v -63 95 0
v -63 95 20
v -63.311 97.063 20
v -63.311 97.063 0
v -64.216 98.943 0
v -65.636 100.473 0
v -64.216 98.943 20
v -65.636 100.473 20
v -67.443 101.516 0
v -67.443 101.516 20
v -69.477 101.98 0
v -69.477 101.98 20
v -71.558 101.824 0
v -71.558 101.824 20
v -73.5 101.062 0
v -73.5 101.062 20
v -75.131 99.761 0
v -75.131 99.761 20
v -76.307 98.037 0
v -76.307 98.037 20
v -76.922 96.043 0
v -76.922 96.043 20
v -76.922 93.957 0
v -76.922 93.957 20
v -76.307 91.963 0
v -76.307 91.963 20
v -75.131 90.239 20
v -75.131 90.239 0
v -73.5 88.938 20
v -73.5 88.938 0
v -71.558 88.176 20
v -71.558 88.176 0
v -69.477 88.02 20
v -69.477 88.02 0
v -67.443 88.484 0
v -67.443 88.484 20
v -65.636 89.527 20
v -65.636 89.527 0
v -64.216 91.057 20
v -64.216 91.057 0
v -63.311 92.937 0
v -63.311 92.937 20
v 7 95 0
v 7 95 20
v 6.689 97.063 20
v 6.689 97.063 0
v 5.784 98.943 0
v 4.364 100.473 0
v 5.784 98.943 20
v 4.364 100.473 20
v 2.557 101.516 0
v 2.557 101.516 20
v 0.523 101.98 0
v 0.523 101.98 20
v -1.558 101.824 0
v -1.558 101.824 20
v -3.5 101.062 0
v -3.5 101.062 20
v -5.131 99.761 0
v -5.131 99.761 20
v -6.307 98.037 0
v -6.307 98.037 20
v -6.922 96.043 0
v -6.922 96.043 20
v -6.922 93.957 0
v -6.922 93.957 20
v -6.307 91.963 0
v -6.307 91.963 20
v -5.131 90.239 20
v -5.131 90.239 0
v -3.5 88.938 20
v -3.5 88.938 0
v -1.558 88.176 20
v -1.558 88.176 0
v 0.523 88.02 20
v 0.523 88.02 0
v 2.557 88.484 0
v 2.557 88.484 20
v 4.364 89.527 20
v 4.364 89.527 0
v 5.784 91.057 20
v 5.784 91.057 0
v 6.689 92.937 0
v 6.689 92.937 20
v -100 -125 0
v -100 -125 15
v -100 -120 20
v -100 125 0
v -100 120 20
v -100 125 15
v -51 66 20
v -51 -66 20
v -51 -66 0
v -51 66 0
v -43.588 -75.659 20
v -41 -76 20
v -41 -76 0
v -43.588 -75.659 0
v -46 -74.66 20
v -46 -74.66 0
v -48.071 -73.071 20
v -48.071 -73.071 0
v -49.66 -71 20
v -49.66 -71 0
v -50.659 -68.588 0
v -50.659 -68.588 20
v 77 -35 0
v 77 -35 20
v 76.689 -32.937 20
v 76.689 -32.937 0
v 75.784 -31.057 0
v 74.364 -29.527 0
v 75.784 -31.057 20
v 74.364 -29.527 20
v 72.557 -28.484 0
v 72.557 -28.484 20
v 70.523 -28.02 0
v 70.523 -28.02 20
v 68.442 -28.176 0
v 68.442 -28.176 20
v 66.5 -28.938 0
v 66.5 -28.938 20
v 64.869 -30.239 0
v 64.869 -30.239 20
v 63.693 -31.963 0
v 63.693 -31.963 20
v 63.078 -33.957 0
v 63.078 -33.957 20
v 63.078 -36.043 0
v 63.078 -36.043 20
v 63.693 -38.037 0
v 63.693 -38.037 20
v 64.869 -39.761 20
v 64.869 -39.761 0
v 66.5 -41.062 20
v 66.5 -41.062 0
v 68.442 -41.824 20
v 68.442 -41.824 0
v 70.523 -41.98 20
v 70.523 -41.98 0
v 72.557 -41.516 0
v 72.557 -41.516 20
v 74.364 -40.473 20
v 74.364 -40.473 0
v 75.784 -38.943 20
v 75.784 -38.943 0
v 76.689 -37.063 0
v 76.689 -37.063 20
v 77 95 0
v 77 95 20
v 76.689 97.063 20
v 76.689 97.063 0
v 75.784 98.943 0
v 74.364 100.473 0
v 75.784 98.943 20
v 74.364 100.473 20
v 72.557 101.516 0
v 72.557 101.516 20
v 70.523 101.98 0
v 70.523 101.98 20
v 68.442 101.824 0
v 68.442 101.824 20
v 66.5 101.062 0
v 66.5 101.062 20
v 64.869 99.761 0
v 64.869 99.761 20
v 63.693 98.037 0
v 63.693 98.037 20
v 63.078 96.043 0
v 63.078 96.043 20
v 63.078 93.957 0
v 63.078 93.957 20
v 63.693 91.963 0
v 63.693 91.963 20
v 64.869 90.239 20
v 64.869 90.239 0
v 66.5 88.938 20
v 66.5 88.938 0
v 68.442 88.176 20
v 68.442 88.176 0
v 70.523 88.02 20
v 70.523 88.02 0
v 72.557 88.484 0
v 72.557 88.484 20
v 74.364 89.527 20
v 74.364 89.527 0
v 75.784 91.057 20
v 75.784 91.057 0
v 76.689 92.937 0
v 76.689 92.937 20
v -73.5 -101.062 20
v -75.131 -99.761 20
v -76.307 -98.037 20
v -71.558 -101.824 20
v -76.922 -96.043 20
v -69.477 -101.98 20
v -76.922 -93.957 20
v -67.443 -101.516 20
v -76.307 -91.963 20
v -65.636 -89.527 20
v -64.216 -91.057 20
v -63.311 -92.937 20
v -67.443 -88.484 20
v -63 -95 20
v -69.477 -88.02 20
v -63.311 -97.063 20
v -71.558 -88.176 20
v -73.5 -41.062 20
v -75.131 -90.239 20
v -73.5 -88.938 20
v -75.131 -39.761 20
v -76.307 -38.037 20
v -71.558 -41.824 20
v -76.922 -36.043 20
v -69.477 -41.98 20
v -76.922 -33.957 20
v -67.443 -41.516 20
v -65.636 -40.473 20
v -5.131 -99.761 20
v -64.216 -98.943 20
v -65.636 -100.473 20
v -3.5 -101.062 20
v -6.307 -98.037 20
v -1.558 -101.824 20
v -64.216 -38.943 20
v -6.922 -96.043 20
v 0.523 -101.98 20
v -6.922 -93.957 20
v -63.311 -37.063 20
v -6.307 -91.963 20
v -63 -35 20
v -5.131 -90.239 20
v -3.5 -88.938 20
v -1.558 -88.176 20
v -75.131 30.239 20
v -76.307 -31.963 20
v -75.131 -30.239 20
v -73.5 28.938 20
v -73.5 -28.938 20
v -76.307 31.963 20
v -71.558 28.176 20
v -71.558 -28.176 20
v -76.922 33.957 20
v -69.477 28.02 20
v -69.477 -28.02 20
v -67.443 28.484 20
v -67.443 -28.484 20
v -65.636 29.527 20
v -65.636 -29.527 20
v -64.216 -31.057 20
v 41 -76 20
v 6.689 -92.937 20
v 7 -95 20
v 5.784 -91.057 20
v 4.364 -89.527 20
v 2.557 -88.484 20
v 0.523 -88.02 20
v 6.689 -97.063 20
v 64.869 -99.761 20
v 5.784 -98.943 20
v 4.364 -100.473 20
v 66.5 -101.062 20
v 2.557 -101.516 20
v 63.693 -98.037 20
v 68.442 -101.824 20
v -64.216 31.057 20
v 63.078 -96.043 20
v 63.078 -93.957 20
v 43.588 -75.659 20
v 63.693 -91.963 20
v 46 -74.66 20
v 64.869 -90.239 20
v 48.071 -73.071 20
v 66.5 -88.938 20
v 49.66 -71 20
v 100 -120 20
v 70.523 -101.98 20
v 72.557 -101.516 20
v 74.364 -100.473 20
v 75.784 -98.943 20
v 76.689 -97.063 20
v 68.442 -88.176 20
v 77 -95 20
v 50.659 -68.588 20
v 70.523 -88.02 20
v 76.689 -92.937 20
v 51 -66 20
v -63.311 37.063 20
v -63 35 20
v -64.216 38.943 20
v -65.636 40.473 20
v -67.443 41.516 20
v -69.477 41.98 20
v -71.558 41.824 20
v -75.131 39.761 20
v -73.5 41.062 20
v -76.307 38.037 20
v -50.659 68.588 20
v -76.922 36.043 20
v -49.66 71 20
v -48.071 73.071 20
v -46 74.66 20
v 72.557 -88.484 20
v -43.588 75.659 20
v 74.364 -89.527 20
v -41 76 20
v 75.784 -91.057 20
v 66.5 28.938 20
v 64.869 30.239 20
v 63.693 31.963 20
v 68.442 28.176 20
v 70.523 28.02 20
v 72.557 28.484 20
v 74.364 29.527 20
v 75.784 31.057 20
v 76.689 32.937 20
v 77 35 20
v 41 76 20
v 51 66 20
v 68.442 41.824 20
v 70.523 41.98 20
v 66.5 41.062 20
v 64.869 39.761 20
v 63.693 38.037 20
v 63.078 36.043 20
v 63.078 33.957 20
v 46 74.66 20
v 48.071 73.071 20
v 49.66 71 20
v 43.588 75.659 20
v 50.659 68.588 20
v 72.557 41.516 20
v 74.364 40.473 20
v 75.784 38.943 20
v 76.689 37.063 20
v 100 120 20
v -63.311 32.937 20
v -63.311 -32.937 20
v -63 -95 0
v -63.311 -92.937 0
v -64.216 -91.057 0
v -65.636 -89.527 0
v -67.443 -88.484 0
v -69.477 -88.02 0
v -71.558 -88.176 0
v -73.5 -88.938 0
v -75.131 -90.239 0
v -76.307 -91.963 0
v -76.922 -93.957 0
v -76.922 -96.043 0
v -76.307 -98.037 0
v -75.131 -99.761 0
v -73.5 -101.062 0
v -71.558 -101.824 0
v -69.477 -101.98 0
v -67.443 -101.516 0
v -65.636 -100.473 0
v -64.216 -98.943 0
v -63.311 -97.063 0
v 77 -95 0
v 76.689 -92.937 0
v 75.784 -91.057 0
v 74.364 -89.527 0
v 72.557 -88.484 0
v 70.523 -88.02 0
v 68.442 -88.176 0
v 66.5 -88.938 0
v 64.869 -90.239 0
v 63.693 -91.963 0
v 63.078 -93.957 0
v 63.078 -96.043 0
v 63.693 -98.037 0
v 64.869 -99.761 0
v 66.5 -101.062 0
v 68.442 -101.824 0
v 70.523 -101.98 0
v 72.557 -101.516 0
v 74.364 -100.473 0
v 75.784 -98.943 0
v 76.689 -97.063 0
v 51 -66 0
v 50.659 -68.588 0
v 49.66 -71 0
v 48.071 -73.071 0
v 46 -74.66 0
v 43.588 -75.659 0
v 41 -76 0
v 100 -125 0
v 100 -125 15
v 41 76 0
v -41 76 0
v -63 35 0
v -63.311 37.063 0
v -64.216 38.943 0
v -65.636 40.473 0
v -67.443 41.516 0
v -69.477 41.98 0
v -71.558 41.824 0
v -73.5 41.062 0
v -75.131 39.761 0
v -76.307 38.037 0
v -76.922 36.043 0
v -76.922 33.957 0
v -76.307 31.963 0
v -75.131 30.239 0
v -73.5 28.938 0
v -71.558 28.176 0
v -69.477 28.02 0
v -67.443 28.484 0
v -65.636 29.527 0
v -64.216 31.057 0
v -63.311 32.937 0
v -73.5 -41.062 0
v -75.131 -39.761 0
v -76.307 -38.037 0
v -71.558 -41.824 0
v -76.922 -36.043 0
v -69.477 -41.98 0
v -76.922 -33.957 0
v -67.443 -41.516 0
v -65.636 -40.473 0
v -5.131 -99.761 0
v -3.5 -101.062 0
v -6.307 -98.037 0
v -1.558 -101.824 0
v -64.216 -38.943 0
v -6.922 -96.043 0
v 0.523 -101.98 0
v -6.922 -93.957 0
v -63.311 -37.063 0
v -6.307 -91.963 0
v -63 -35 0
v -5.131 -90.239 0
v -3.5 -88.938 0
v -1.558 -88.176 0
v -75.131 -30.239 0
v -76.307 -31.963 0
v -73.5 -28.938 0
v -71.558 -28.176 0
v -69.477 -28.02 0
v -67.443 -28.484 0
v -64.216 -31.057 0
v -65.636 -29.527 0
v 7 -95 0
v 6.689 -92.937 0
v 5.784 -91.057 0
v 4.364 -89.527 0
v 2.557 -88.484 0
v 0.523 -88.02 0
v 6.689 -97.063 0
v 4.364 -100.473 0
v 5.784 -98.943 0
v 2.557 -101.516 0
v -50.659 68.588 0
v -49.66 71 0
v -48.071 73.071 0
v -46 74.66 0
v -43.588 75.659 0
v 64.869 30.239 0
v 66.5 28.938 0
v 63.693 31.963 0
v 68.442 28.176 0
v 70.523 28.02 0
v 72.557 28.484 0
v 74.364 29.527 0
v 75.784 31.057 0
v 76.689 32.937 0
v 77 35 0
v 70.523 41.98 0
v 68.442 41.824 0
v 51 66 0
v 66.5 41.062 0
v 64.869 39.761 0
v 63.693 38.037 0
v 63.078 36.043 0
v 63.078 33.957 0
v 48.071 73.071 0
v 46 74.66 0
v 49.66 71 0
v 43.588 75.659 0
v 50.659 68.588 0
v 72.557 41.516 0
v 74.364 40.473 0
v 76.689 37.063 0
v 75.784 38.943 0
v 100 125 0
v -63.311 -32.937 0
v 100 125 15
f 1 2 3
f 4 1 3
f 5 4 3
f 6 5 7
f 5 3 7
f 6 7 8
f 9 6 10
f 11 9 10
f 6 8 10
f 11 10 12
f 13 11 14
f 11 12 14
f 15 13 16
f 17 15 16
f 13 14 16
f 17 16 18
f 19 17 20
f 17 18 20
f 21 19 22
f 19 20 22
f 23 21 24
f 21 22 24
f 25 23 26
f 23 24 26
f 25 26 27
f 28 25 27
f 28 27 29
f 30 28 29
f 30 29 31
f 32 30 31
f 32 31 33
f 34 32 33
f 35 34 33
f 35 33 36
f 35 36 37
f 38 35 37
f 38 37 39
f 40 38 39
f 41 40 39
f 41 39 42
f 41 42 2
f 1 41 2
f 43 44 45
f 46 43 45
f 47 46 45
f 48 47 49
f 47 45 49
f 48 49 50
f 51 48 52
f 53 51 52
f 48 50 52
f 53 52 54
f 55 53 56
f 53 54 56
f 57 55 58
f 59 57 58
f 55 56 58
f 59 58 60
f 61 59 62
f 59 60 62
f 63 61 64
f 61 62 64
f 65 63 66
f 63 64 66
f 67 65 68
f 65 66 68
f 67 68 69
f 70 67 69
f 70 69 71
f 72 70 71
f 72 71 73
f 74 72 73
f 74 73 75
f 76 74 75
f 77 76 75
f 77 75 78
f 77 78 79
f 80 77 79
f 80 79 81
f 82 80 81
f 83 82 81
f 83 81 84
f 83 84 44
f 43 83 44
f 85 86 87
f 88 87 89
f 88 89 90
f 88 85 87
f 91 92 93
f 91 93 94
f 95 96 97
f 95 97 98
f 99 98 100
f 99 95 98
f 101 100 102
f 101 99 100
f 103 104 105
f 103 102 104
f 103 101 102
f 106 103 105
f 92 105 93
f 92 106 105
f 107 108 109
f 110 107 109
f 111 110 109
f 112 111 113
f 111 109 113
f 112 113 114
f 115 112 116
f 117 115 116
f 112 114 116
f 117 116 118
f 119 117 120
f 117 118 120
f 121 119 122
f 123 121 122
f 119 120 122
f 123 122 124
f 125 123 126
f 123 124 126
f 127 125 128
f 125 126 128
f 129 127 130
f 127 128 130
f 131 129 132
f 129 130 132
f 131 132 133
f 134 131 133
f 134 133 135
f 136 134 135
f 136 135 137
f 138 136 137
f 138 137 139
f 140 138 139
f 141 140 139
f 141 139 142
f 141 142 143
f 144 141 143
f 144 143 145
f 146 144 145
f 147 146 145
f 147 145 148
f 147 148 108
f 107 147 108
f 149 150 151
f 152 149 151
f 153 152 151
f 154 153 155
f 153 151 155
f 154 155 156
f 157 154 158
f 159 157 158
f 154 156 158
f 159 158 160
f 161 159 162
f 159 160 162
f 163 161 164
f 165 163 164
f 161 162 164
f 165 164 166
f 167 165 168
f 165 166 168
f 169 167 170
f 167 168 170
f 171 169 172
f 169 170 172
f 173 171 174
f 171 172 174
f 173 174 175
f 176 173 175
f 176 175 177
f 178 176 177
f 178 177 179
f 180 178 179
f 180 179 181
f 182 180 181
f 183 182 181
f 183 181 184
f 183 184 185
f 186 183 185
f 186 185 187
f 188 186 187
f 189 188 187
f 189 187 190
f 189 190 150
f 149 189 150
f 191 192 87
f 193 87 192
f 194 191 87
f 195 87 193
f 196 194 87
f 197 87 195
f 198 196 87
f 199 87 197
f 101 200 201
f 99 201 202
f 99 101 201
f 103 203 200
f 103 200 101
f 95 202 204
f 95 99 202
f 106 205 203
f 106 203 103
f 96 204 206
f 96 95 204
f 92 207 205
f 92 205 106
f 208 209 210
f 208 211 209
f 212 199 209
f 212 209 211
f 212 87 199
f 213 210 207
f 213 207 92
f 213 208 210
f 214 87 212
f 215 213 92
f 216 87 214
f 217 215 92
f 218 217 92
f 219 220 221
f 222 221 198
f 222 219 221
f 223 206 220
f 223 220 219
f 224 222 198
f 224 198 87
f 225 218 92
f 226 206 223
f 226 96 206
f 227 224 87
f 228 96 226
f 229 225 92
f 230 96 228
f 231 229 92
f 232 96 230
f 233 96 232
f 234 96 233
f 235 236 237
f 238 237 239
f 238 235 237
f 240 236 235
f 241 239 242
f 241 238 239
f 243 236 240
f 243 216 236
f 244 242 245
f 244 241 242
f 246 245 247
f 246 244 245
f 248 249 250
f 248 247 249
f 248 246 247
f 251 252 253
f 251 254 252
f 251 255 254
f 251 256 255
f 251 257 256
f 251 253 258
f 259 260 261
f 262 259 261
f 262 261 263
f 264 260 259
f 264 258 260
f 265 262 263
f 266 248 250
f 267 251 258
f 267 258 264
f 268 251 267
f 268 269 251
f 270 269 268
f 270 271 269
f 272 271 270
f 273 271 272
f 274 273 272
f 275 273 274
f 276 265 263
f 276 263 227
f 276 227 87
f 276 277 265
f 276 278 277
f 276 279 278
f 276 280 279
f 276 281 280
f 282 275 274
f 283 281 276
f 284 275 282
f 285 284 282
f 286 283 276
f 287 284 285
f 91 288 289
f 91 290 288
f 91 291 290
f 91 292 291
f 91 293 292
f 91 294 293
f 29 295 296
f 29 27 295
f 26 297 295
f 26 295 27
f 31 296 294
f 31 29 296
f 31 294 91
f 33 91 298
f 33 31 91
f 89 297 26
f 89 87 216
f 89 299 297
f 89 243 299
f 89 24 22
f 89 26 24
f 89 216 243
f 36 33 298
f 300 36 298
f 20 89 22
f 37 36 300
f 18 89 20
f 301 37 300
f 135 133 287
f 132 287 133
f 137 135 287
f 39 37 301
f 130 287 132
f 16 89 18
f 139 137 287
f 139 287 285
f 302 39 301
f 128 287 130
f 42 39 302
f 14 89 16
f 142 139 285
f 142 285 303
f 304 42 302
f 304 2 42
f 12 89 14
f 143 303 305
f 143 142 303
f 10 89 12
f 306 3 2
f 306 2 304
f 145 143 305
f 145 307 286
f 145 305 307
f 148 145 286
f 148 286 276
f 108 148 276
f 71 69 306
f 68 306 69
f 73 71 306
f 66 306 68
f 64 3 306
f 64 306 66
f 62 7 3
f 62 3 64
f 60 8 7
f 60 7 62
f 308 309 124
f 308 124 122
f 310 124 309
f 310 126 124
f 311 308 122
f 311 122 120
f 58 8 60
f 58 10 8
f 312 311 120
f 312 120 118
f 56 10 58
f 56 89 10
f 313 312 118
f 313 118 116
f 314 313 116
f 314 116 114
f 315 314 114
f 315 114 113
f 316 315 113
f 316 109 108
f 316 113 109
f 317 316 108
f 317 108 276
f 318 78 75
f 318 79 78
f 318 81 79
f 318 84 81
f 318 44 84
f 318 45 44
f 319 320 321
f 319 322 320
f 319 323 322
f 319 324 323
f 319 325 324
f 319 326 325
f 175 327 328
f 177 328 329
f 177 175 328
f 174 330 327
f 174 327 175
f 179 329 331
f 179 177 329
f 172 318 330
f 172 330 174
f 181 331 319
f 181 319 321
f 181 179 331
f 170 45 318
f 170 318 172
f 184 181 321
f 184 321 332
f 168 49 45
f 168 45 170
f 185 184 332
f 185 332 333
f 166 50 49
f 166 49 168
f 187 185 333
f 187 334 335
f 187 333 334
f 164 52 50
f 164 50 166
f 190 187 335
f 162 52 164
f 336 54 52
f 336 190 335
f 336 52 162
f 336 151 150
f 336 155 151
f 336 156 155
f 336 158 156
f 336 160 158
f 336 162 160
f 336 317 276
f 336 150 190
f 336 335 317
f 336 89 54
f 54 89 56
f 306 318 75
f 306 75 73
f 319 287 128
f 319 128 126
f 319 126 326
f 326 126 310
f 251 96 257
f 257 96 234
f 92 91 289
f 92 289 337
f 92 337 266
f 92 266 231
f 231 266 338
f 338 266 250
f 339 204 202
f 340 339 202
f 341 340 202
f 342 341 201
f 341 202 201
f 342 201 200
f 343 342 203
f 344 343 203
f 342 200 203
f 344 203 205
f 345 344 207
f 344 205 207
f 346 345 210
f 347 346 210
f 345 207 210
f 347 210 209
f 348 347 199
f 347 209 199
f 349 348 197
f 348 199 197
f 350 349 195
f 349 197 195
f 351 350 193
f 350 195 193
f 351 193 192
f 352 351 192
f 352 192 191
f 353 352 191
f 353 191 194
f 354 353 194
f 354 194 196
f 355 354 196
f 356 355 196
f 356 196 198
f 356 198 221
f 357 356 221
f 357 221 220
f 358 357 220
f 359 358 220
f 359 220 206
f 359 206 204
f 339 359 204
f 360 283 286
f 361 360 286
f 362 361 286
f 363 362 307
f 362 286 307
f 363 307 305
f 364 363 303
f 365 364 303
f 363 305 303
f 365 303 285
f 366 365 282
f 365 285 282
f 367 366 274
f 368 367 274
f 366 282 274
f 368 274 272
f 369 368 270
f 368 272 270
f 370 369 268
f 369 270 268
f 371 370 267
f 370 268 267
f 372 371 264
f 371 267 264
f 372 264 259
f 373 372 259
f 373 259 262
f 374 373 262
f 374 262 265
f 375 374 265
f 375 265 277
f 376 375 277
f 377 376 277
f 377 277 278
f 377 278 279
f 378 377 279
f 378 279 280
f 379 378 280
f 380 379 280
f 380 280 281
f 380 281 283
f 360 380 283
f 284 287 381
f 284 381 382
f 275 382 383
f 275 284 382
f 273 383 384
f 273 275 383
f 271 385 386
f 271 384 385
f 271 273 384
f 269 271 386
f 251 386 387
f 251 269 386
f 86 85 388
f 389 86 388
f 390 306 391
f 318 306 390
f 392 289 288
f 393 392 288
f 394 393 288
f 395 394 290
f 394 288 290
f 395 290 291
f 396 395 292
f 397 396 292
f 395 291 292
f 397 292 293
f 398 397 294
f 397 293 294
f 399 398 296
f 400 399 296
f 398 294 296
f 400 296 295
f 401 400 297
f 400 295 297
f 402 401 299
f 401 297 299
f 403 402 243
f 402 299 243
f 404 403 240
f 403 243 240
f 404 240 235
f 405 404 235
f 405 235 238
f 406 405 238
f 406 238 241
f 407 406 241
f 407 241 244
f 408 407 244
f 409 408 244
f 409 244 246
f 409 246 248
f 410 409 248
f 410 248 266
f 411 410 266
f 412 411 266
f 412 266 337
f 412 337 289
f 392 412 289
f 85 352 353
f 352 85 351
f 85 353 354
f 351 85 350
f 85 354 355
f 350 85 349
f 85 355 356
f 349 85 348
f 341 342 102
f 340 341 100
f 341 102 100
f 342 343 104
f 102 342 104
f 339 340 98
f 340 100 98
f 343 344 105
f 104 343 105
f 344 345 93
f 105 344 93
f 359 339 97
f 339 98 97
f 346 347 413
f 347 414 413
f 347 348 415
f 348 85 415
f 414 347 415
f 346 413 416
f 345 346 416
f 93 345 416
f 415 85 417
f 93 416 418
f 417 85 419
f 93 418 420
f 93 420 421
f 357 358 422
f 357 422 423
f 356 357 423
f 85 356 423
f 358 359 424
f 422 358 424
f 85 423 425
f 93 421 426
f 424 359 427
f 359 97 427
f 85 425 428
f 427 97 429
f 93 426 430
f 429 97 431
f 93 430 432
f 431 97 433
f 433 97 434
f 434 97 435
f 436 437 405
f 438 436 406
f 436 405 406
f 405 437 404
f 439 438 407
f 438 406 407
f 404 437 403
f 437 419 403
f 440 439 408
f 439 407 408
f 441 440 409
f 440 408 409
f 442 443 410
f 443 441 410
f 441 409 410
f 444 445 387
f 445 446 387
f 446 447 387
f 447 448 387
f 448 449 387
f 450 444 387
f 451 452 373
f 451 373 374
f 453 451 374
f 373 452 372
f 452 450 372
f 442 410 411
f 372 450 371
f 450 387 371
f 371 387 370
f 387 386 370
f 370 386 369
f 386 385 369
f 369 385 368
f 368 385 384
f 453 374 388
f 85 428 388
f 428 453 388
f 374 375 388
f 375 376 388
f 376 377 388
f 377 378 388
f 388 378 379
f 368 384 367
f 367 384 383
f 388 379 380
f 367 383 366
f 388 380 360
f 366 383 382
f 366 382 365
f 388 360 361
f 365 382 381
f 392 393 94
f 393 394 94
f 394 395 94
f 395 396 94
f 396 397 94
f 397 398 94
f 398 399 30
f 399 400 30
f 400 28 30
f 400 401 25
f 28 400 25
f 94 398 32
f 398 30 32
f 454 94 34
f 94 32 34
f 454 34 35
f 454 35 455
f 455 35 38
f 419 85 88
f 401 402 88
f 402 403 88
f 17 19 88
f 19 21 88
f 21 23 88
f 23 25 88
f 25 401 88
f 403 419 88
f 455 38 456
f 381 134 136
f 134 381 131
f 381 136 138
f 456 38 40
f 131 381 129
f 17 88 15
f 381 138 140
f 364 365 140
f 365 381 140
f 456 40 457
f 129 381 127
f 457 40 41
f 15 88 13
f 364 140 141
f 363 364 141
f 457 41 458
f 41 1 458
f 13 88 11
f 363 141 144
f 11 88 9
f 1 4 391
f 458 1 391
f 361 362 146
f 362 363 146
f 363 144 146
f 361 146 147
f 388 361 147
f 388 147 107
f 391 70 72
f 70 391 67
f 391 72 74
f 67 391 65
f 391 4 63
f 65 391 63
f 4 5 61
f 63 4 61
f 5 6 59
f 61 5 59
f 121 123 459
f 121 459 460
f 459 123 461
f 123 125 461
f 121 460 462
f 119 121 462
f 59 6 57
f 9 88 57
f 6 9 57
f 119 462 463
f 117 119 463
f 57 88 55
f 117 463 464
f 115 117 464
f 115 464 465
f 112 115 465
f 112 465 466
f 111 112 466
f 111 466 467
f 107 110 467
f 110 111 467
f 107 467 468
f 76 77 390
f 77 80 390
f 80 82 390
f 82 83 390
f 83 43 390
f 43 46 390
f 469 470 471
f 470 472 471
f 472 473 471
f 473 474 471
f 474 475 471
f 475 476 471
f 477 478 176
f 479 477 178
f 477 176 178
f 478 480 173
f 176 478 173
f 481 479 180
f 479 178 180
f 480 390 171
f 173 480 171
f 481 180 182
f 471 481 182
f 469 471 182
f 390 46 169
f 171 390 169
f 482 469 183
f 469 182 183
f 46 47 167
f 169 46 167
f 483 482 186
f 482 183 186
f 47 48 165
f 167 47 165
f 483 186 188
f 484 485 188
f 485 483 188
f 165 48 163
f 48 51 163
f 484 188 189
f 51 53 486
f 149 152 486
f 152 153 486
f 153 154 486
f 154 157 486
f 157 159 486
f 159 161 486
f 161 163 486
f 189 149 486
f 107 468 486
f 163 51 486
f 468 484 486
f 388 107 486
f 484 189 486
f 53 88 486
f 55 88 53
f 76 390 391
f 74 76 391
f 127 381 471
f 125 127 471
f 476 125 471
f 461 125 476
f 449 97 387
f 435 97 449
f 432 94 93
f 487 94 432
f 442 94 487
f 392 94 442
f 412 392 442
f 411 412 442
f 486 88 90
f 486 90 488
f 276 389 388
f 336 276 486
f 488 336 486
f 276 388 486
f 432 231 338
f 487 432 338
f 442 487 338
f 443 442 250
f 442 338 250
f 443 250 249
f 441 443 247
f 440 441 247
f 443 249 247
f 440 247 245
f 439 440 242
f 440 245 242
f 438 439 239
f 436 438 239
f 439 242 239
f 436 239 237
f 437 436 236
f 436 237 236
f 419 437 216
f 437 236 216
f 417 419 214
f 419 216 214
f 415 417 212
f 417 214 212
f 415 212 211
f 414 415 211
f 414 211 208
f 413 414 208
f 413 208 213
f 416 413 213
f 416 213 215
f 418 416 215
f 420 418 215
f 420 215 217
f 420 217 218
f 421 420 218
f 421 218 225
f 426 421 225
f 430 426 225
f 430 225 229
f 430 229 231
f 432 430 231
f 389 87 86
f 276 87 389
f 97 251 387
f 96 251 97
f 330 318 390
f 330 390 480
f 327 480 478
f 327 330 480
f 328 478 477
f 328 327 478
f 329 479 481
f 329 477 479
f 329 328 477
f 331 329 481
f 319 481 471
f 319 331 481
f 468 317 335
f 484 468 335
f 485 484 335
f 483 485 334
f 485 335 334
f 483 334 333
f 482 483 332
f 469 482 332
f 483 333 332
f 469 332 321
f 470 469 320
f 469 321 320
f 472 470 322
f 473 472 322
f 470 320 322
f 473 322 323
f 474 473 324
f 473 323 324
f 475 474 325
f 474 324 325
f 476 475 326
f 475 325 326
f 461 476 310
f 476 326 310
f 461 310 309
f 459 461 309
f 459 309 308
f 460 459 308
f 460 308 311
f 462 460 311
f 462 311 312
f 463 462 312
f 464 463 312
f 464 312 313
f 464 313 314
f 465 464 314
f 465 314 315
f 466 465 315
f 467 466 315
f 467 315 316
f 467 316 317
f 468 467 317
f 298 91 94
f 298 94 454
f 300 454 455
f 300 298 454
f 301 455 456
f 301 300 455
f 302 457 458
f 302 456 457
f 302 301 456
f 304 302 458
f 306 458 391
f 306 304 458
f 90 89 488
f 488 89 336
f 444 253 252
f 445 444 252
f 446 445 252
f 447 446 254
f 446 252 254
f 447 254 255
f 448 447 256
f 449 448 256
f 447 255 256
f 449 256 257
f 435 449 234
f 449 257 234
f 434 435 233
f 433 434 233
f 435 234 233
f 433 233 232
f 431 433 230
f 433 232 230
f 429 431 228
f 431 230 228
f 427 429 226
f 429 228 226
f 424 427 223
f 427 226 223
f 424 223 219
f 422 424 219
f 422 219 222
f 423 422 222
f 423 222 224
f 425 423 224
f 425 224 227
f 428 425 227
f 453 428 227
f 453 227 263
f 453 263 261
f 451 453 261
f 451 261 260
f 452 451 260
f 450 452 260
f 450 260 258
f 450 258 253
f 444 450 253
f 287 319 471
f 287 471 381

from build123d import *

# Parameters (mm, degrees)
SKETCH_1_W          = 200
SKETCH_1_H          = 250
EXTRUDE_1_DEPTH     = 20
CUT_EXTRUDE_1_REACH = 163.323
SKETCH_2_R          = 7
CHAMFER_1_SIZE      = 5


with BuildPart() as part:
    # 草图1 → 凸台-拉伸1 (new body)
    with BuildSketch(Plane.XY):
        Rectangle(SKETCH_1_W, SKETCH_1_H)
    extrude(amount=EXTRUDE_1_DEPTH)

    # 草图2 → 切除-拉伸1 (cut, up to next)
    with BuildSketch(Plane.XY.offset(20), mode=Mode.PRIVATE) as cut_extrude_1_sk1:
        with Locations((-70, 95)):
            Circle(SKETCH_2_R)
    cut_extrude_1_tool1 = extrude(cut_extrude_1_sk1.sketch, amount=-CUT_EXTRUDE_1_REACH, mode=Mode.PRIVATE) & part.part
    # 草图2 → 切除-拉伸1 (cut, up to next)
    with BuildSketch(Plane.XY.offset(20), mode=Mode.PRIVATE) as cut_extrude_1_sk2:
        with Locations((0, 95)):
            Circle(SKETCH_2_R)
    cut_extrude_1_tool2 = extrude(cut_extrude_1_sk2.sketch, amount=-CUT_EXTRUDE_1_REACH, mode=Mode.PRIVATE) & part.part
    # 草图2 → 切除-拉伸1 (cut, up to next)
    with BuildSketch(Plane.XY.offset(20), mode=Mode.PRIVATE) as cut_extrude_1_sk3:
        with Locations((70, 95)):
            Circle(SKETCH_2_R)
    cut_extrude_1_tool3 = extrude(cut_extrude_1_sk3.sketch, amount=-CUT_EXTRUDE_1_REACH, mode=Mode.PRIVATE) & part.part
    # 草图2 → 切除-拉伸1 (cut, up to next)
    with BuildSketch(Plane.XY.offset(20), mode=Mode.PRIVATE) as cut_extrude_1_sk4:
        with Locations((-70, 35)):
            Circle(SKETCH_2_R)
    cut_extrude_1_tool4 = extrude(cut_extrude_1_sk4.sketch, amount=-CUT_EXTRUDE_1_REACH, mode=Mode.PRIVATE) & part.part
    # 草图2 → 切除-拉伸1 (cut, up to next)
    with BuildSketch(Plane.XY.offset(20), mode=Mode.PRIVATE) as cut_extrude_1_sk5:
        with Locations((70, 35)):
            Circle(SKETCH_2_R)
    cut_extrude_1_tool5 = extrude(cut_extrude_1_sk5.sketch, amount=-CUT_EXTRUDE_1_REACH, mode=Mode.PRIVATE) & part.part
    # 草图2 → 切除-拉伸1 (cut, up to next)
    with BuildSketch(Plane.XY.offset(20), mode=Mode.PRIVATE) as cut_extrude_1_sk6:
        with Locations((-70, -35)):
            Circle(SKETCH_2_R)
    cut_extrude_1_tool6 = extrude(cut_extrude_1_sk6.sketch, amount=-CUT_EXTRUDE_1_REACH, mode=Mode.PRIVATE) & part.part
    # 草图2 → 切除-拉伸1 (cut, up to next)
    with BuildSketch(Plane.XY.offset(20), mode=Mode.PRIVATE) as cut_extrude_1_sk7:
        with Locations((0, -95)):
            Circle(SKETCH_2_R)
    cut_extrude_1_tool7 = extrude(cut_extrude_1_sk7.sketch, amount=-CUT_EXTRUDE_1_REACH, mode=Mode.PRIVATE) & part.part
    # 草图2 → 切除-拉伸1 (cut, up to next)
    with BuildSketch(Plane.XY.offset(20), mode=Mode.PRIVATE) as cut_extrude_1_sk8:
        with Locations((-70, -95)):
            Circle(SKETCH_2_R)
    cut_extrude_1_tool8 = extrude(cut_extrude_1_sk8.sketch, amount=-CUT_EXTRUDE_1_REACH, mode=Mode.PRIVATE) & part.part
    # 草图2 → 切除-拉伸1 (cut, up to next)
    with BuildSketch(Plane.XY.offset(20), mode=Mode.PRIVATE) as cut_extrude_1_sk9:
        with Locations((70, -35)):
            Circle(SKETCH_2_R)
    cut_extrude_1_tool9 = extrude(cut_extrude_1_sk9.sketch, amount=-CUT_EXTRUDE_1_REACH, mode=Mode.PRIVATE) & part.part
    # 草图2 → 切除-拉伸1 (cut, up to next)
    with BuildSketch(Plane.XY.offset(20), mode=Mode.PRIVATE) as cut_extrude_1_sk10:
        with Locations((70, -95)):
            Circle(SKETCH_2_R)
    cut_extrude_1_tool10 = extrude(cut_extrude_1_sk10.sketch, amount=-CUT_EXTRUDE_1_REACH, mode=Mode.PRIVATE) & part.part
    # 草图2 → 切除-拉伸1 (cut, up to next)
    with BuildSketch(Plane.XY.offset(20), mode=Mode.PRIVATE) as cut_extrude_1_sk11:
        with BuildLine():
            Line((-41, 76), (41, 76))
            ThreePointArc((41, 76), (48.071067812, 73.071067812), (51, 66))
            Line((51, 66), (51, -66))
            ThreePointArc((51, -66), (48.071067812, -73.071067812), (41, -76))
            Line((41, -76), (-41, -76))
            ThreePointArc((-41, -76), (-48.071067812, -73.071067812), (-51, -66))
            Line((-51, -66), (-51, 66))
            ThreePointArc((-51, 66), (-48.071067812, 73.071067812), (-41, 76))
        make_face()
    cut_extrude_1_tool11 = extrude(cut_extrude_1_sk11.sketch, amount=-CUT_EXTRUDE_1_REACH, mode=Mode.PRIVATE) & part.part
    add(cut_extrude_1_tool1.solids().sort_by_distance((-70, 95, 20))[0], mode=Mode.SUBTRACT)
    add(cut_extrude_1_tool2.solids().sort_by_distance((0, 95, 20))[0], mode=Mode.SUBTRACT)
    add(cut_extrude_1_tool3.solids().sort_by_distance((70, 95, 20))[0], mode=Mode.SUBTRACT)
    add(cut_extrude_1_tool4.solids().sort_by_distance((-70, 35, 20))[0], mode=Mode.SUBTRACT)
    add(cut_extrude_1_tool5.solids().sort_by_distance((70, 35, 20))[0], mode=Mode.SUBTRACT)
    add(cut_extrude_1_tool6.solids().sort_by_distance((-70, -35, 20))[0], mode=Mode.SUBTRACT)
    add(cut_extrude_1_tool7.solids().sort_by_distance((0, -95, 20))[0], mode=Mode.SUBTRACT)
    add(cut_extrude_1_tool8.solids().sort_by_distance((-70, -95, 20))[0], mode=Mode.SUBTRACT)
    add(cut_extrude_1_tool9.solids().sort_by_distance((70, -35, 20))[0], mode=Mode.SUBTRACT)
    add(cut_extrude_1_tool10.solids().sort_by_distance((70, -95, 20))[0], mode=Mode.SUBTRACT)
    add(cut_extrude_1_tool11.solids().sort_by_distance((0, 0, 20))[0], mode=Mode.SUBTRACT)

    # 倒角1
    chamfer_1_edges = [part.edges().sort_by_distance(p)[0] for p in [
        (0, -125, 20),
        (0, 125, 20),
    ]]
    chamfer(chamfer_1_edges, length=CHAMFER_1_SIZE)


solid = part.part
